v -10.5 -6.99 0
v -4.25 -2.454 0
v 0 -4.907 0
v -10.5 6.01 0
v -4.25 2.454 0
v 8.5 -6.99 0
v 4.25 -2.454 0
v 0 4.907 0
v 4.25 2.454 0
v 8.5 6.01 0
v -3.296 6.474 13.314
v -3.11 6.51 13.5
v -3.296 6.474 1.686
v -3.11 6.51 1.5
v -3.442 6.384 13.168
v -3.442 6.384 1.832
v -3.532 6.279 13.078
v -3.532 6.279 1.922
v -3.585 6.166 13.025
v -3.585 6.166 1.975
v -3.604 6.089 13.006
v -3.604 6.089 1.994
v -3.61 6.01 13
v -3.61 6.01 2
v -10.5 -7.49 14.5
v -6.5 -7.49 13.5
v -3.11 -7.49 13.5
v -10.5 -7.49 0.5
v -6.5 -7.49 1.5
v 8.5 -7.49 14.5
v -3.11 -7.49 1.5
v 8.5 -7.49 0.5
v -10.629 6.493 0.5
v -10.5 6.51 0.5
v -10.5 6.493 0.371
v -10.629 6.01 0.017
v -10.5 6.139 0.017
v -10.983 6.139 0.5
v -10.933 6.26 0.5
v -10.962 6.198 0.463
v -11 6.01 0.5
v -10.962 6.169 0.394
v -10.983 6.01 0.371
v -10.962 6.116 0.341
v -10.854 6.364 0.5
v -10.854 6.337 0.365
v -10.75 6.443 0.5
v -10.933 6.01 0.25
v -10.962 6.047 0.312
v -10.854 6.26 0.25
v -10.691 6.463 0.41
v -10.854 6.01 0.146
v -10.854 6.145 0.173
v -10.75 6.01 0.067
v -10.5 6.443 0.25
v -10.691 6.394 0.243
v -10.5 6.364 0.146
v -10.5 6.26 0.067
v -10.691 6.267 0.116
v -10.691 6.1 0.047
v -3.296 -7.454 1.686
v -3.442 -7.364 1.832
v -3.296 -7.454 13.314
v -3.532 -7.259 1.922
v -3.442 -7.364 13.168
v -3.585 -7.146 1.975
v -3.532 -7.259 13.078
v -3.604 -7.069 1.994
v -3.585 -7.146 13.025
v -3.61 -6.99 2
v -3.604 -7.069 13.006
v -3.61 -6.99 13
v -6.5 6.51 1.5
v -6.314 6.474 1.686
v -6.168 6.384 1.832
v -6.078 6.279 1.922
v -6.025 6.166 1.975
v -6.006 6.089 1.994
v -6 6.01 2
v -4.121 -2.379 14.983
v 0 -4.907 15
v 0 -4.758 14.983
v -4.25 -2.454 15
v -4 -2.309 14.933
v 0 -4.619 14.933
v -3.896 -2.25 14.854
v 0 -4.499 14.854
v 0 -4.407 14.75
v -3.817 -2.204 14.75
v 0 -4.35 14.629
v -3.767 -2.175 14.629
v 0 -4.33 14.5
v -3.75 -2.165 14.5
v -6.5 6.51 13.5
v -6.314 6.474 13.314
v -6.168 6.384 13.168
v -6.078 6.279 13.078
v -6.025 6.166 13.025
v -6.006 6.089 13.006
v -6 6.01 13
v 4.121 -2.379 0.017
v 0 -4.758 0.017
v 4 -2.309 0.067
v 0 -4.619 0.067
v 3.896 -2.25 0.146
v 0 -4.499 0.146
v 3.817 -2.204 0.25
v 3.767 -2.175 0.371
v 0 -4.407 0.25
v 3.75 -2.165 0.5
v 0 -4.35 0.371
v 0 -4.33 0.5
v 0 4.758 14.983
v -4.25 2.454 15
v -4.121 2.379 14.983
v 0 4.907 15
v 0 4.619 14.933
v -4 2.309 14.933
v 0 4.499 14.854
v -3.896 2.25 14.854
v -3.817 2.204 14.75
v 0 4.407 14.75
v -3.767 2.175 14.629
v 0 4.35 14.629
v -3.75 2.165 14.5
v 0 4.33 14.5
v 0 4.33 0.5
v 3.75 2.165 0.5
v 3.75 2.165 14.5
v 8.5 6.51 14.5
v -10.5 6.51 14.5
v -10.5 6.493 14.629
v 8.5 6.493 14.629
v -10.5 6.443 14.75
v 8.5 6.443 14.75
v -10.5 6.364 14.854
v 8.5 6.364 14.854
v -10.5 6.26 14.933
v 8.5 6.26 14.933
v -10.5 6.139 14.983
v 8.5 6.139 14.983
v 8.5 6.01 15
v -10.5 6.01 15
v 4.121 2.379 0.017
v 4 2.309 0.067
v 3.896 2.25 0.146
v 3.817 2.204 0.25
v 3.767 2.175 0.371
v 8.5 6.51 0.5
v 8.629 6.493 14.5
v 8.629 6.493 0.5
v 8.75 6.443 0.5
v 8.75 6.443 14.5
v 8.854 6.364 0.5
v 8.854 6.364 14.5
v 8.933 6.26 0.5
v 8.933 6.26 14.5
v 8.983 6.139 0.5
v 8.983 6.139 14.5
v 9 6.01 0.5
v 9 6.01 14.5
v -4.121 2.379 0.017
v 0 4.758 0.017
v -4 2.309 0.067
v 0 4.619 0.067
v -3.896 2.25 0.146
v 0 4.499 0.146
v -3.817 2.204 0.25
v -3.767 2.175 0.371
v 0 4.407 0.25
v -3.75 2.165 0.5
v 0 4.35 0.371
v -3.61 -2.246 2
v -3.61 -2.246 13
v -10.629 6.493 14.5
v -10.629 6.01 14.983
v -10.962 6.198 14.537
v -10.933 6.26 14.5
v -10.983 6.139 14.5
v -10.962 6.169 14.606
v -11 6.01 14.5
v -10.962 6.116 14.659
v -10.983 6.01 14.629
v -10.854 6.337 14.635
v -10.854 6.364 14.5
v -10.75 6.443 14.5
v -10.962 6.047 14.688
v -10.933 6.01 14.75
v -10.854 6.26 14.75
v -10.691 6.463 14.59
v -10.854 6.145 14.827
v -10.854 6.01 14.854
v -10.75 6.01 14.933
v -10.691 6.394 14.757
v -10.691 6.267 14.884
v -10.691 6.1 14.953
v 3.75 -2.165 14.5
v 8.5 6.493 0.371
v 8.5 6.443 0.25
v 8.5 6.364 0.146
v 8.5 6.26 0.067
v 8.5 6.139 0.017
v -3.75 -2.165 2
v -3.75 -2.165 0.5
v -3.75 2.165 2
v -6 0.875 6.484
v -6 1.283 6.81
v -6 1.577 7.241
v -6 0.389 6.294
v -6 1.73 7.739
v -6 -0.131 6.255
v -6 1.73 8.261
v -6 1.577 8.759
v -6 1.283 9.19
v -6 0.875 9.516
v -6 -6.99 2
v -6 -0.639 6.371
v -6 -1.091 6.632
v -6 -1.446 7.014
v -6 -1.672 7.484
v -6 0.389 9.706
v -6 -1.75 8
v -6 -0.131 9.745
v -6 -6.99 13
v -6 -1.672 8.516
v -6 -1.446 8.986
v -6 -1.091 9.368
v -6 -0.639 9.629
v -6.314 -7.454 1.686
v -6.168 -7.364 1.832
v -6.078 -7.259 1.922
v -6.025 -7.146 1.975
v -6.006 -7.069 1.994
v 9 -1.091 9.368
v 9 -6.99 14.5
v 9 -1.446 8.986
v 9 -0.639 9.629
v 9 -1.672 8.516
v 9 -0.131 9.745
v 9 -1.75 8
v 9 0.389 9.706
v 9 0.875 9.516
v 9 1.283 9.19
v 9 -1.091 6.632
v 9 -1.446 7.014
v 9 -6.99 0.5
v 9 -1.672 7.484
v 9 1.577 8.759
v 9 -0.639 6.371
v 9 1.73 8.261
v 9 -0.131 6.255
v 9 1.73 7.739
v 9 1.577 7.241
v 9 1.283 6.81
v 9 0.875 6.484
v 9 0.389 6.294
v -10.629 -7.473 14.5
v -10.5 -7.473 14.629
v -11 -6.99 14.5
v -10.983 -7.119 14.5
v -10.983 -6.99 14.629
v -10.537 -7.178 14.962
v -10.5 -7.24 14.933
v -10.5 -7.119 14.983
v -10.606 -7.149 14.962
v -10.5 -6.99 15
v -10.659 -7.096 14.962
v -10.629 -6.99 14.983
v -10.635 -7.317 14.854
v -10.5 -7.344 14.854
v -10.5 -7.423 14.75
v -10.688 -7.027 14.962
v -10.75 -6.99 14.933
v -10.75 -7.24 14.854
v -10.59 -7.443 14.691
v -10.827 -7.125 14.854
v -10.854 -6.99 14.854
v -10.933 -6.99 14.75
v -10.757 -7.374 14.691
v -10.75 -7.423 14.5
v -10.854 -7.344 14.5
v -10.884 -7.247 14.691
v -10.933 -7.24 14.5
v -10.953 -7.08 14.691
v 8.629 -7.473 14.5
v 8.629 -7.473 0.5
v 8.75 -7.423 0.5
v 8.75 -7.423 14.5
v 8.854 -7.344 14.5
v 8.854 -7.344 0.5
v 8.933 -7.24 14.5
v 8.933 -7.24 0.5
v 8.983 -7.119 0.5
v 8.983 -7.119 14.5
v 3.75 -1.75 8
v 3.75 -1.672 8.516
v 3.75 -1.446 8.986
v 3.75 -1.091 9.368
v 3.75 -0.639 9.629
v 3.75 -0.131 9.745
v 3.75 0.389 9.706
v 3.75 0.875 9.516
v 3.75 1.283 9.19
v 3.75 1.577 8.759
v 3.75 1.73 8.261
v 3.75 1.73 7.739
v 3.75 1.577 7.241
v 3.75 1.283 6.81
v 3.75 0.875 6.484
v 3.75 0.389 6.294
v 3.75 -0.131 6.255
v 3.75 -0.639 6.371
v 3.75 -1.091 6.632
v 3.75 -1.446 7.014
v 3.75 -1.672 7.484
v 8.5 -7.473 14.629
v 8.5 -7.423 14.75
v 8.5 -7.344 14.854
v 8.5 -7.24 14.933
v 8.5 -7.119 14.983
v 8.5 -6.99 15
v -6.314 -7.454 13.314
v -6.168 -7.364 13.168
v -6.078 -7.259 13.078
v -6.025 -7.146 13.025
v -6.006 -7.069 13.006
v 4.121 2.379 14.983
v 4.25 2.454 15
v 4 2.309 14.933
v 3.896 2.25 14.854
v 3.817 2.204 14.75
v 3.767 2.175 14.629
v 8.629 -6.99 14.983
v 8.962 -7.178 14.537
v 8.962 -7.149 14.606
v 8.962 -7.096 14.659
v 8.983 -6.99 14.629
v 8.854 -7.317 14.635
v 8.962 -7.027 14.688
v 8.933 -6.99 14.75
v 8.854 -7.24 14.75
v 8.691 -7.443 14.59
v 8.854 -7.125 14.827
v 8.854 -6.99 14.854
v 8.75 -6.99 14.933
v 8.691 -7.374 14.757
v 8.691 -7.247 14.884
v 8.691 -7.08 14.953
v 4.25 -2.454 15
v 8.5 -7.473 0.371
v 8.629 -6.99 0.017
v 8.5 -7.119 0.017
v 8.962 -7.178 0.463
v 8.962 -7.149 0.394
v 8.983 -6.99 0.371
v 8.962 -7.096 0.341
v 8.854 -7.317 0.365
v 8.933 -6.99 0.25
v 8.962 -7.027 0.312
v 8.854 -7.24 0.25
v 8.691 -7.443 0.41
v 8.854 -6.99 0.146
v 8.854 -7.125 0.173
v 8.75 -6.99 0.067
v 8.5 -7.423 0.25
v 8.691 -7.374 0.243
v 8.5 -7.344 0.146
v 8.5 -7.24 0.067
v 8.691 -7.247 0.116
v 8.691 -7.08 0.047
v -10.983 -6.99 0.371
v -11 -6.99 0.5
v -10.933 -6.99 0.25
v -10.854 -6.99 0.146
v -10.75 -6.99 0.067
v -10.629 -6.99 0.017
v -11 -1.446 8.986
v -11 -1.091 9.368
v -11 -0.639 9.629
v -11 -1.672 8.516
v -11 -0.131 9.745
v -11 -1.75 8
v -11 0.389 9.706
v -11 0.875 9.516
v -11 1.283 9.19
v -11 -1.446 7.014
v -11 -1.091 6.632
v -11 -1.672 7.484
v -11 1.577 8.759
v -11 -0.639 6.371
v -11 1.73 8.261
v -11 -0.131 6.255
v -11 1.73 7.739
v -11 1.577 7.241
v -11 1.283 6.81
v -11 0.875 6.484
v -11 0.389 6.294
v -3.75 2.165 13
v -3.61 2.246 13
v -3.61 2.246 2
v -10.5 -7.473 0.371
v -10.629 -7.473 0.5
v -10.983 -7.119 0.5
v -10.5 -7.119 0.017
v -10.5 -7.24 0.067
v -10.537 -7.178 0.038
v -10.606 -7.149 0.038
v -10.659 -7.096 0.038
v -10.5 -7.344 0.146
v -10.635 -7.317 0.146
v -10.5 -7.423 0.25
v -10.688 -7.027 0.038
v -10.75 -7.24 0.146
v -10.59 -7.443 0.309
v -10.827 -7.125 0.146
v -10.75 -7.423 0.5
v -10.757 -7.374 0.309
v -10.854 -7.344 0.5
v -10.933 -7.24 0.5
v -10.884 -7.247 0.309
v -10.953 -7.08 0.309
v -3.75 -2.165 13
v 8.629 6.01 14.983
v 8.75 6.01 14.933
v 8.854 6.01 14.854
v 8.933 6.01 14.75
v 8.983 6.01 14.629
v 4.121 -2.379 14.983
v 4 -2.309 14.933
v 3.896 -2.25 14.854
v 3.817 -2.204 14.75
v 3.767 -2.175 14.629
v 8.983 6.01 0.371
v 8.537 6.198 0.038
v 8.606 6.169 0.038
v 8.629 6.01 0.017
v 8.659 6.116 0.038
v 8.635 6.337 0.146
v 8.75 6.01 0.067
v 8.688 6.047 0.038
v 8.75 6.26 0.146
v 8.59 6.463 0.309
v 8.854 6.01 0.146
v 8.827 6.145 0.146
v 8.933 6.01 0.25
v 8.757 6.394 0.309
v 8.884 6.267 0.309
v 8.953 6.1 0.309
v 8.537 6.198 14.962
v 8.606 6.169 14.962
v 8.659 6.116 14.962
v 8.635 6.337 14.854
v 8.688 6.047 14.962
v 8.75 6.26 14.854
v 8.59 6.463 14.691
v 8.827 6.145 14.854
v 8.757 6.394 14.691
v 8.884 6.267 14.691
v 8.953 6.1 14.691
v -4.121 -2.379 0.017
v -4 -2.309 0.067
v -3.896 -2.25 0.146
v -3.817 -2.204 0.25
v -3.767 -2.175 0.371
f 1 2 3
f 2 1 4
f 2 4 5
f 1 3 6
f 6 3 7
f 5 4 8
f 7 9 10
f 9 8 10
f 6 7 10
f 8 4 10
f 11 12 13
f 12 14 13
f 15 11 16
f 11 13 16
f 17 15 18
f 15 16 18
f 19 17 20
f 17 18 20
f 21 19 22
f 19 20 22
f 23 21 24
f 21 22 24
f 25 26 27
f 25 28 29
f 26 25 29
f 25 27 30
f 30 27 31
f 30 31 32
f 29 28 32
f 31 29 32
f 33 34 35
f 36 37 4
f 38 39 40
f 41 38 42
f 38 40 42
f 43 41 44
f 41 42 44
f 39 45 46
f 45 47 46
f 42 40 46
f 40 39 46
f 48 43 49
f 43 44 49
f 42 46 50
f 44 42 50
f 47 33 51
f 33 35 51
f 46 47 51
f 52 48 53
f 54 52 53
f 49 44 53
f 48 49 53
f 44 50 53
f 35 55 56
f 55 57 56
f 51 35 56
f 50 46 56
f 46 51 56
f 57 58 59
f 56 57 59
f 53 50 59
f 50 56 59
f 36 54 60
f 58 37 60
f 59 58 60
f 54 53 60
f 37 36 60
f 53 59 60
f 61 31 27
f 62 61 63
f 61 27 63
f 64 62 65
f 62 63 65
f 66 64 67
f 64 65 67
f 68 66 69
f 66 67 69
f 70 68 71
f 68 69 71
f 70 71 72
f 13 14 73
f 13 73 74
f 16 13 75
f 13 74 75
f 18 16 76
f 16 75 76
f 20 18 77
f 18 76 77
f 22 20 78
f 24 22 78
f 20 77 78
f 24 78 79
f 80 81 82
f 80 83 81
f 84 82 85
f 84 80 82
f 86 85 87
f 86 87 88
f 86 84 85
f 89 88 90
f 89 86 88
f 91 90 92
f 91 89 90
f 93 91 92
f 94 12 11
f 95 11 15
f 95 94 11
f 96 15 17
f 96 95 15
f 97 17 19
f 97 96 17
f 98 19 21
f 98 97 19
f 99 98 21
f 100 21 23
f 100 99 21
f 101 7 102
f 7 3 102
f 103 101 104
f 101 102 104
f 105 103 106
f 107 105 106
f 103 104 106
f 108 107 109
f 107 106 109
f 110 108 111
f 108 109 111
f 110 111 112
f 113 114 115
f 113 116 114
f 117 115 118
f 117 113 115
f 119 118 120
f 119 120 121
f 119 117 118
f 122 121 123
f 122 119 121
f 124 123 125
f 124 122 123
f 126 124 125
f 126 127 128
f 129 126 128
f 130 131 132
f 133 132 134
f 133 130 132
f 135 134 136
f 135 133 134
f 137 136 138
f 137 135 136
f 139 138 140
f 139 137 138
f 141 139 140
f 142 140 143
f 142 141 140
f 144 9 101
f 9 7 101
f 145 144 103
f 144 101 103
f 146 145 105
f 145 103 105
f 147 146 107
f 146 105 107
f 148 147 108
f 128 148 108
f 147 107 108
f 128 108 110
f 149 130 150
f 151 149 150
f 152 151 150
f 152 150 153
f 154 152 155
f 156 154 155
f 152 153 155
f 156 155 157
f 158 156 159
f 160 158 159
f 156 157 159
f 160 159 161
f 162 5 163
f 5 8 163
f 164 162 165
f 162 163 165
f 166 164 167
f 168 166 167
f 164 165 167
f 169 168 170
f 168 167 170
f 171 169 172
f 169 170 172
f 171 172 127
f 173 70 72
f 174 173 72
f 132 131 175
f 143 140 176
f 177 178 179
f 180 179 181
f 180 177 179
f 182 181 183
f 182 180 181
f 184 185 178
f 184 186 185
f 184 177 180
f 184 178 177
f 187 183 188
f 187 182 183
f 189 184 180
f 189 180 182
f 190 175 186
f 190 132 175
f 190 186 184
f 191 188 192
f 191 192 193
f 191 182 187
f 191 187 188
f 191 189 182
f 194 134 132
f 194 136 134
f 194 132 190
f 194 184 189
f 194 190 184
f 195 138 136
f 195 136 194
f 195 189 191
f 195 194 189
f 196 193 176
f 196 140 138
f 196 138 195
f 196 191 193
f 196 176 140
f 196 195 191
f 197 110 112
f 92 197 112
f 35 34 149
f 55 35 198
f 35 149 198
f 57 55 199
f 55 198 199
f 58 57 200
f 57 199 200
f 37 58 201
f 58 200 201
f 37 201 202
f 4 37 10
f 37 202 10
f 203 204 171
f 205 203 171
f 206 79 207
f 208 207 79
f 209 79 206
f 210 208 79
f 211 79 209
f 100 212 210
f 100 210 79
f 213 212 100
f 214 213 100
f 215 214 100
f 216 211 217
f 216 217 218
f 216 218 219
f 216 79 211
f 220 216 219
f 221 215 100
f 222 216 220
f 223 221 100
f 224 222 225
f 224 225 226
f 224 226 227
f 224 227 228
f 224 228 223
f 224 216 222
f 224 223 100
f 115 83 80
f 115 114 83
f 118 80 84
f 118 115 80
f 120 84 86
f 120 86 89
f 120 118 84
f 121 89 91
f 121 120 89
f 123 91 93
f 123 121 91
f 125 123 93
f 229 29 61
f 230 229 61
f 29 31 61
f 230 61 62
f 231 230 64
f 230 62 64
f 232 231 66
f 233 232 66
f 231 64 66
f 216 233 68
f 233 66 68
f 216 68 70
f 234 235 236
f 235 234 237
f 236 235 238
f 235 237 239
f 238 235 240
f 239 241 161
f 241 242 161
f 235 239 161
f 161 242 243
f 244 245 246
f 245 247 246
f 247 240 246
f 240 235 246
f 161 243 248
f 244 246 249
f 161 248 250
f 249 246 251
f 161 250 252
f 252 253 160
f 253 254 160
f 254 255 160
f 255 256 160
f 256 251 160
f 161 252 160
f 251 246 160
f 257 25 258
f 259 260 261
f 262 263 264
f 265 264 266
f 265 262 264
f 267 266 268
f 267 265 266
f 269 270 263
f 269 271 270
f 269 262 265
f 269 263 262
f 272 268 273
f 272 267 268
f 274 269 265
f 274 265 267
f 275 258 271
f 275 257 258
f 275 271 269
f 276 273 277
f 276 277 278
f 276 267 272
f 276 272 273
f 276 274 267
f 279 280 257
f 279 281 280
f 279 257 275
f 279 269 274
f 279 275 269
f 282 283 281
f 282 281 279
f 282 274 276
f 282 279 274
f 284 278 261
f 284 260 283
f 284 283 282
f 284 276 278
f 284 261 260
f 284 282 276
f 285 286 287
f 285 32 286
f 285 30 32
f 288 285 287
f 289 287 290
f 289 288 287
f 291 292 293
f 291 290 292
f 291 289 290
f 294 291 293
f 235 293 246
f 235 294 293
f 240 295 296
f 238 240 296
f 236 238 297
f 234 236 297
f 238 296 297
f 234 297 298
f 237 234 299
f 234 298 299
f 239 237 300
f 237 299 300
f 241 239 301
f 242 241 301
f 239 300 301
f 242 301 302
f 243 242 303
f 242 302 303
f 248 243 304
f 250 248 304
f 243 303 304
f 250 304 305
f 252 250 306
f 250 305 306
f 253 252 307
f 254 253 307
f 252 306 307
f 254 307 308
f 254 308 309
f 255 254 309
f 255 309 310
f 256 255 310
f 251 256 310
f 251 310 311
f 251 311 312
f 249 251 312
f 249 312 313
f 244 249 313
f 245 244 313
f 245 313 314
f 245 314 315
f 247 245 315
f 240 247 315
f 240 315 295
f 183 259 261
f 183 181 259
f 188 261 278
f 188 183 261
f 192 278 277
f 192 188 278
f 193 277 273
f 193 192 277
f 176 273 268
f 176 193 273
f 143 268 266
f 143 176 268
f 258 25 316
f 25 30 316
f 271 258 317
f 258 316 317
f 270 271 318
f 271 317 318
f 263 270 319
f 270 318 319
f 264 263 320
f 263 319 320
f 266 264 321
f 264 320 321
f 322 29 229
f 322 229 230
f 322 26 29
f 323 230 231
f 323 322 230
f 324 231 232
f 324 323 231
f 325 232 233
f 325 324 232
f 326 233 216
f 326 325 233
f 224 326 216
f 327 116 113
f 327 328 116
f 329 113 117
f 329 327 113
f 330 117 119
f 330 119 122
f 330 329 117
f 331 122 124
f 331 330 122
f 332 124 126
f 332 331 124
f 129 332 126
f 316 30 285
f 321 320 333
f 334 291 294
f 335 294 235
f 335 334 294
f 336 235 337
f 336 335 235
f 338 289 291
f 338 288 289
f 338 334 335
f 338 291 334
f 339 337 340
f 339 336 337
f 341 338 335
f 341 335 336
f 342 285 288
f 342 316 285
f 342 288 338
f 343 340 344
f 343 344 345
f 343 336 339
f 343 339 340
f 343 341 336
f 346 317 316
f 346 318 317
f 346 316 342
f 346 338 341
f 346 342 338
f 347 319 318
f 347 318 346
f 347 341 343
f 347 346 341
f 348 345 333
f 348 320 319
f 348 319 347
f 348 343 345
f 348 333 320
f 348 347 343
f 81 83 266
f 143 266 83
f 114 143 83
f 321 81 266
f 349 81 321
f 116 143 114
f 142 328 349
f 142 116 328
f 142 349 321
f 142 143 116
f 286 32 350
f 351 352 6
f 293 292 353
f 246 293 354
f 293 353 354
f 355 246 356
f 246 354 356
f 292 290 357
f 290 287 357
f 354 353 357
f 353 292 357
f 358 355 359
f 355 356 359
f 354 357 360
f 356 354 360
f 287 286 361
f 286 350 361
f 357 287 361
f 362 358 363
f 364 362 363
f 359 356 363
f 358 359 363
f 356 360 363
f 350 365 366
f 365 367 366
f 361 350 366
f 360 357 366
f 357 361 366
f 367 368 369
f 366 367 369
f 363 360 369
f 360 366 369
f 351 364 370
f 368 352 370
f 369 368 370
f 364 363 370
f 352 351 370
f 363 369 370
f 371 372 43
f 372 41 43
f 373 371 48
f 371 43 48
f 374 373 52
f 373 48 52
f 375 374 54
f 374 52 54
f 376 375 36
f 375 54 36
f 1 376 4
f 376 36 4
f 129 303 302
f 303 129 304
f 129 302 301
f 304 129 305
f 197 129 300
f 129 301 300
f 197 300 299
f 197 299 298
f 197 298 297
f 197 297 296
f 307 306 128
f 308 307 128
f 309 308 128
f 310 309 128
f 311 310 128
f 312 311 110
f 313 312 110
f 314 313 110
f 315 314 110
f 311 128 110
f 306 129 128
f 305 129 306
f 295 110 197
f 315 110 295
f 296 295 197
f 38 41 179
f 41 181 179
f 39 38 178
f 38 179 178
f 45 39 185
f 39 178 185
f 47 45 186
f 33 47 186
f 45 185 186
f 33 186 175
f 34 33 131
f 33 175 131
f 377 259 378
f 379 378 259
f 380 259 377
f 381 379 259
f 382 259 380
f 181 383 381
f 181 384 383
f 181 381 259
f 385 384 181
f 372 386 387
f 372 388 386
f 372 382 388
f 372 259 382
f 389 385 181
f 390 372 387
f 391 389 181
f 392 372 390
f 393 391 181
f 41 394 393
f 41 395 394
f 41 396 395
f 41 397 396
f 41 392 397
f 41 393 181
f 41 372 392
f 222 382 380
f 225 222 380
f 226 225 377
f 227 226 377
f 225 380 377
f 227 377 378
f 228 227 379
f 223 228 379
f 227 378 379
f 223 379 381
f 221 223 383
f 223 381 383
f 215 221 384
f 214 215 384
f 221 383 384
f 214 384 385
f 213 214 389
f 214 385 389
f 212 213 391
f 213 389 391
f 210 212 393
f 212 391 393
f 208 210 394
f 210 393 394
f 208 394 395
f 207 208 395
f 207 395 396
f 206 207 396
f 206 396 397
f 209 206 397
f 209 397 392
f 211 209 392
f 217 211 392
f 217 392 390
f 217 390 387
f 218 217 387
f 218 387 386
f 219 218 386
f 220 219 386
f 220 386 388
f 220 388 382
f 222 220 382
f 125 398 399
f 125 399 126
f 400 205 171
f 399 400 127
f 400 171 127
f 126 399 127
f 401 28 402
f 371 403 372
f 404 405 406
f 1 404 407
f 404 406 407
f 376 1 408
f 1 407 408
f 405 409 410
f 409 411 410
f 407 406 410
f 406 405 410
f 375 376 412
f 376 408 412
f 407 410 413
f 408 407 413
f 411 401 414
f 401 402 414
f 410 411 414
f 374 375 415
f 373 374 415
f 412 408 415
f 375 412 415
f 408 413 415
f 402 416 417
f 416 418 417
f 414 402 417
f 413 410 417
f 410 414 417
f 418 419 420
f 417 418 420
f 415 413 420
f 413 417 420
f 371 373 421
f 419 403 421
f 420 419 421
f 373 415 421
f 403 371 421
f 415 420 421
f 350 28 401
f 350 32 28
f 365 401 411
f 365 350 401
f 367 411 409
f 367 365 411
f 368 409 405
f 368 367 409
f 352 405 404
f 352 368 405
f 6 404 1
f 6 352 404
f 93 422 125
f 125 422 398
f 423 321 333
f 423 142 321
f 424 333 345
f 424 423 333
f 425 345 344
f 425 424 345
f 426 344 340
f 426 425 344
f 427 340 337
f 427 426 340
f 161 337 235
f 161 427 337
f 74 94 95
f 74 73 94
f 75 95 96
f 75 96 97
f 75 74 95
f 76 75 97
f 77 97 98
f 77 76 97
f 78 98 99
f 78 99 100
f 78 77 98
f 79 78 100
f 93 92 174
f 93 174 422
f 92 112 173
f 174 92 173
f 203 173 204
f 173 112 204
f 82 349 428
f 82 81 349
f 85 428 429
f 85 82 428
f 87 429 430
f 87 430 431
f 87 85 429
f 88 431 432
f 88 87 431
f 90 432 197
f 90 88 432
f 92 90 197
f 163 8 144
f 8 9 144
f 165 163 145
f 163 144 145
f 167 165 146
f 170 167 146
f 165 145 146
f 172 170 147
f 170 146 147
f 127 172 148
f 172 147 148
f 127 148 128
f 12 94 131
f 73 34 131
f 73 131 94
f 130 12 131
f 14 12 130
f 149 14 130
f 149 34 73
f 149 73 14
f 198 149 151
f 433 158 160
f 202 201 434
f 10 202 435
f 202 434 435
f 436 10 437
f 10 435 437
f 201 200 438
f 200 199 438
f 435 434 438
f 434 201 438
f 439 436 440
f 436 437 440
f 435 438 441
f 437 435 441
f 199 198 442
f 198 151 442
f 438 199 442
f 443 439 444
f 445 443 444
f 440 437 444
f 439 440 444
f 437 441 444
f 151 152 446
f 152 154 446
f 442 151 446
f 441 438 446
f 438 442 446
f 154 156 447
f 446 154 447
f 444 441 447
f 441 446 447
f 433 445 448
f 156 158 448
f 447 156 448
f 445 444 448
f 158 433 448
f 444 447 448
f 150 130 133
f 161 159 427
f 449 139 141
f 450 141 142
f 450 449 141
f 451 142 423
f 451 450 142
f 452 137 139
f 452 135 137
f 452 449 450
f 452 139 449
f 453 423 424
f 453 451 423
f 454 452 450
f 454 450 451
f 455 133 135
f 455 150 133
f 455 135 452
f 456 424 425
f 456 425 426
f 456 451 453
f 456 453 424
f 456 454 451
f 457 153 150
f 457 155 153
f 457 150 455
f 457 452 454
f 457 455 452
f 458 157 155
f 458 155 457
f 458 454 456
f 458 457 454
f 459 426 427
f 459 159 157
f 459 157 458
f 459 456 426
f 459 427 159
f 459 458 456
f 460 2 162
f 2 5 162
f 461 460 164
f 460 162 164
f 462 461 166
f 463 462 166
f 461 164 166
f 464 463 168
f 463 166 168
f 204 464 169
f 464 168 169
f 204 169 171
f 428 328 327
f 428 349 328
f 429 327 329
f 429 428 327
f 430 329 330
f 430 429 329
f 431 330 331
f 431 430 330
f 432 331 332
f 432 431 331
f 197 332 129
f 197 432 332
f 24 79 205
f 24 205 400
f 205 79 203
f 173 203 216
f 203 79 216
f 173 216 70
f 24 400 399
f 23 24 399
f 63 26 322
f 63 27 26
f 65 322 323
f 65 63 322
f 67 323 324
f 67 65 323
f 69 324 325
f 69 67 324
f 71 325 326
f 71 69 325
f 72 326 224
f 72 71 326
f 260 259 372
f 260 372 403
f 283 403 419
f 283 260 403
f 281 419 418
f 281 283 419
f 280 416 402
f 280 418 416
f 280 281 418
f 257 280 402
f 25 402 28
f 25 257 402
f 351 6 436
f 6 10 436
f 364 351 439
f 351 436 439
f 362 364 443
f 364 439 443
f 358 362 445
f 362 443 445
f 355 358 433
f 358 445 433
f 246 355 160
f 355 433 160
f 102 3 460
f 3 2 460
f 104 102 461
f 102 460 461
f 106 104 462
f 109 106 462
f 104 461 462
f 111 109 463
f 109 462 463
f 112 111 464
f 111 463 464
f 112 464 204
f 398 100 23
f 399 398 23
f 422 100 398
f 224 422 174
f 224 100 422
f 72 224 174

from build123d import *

# Parameters (mm, degrees)
F0_W          = 20
F0_H          = 14
F1_DEPTH      = 15
F2_W          = 2.39
F2_H          = 11
F3_DEPTH      = 14.001
F5_R          = 0.5
F4_R          = 1.75
F6_DEPTH      = 42
F6_DEPTH_BACK = 20.001


# Not quite as in the source:
# - an extrude ends at something that could not be found from the text; its depth is read off the source's solid


with BuildPart() as f1:
    # F0 (on Top) → F1 (new body)
    with BuildSketch(Plane.XY):
        with Locations((-1, -0.4900455125)):
            Rectangle(F0_W, F0_H)
        Polygon((3.75, -2.1650635095), (0, -4.3301270189), (-3.75, -2.1650635095), (-3.75, 2.1650635095), (0, 4.3301270189), (3.75, 2.1650635095), align=None, mode=Mode.SUBTRACT)
    extrude(amount=F1_DEPTH)

    # F2 (on face) → F3 (cut, through all)
    with BuildSketch(Plane.XZ.offset(7.4900455125)):
        with Locations((-4.805, 7.5)):
            Rectangle(F2_W, F2_H)
    extrude(amount=-F3_DEPTH, mode=Mode.SUBTRACT)

    # F5
    f5_edges = [f1.edges().sort_by_distance(p)[0] for p in [
        (-11, -7.490046, 7.5),
        (-1, -7.490046, 0),
        (-1, -7.490046, 15),
        (9, -7.490046, 7.5),
        (-3.61, -7.490046, 7.5),
        (-4.805, -7.490046, 2),
        (-6, -7.490046, 7.5),
        (-4.805, -7.490046, 13),
        (9, 6.509954, 7.5),
        (-1, 6.509954, 0),
        (-1, 6.509954, 15),
        (-11, 6.509954, 7.5),
        (-4.805, 6.509954, 13),
        (-6, 6.509954, 7.5),
        (-4.805, 6.509954, 2),
        (-3.61, 6.509954, 7.5),
        (9, -0.490046, 15),
        (-11, -0.490046, 15),
        (3.75, 0, 15),
        (1.875, -3.247595, 15),
        (-1.875, -3.247595, 15),
        (-3.75, 0, 15),
        (-1.875, 3.247595, 15),
        (1.875, 3.247595, 15),
        (9, -0.490046, 0),
        (-11, -0.490046, 0),
        (3.75, 0, 0),
        (1.875, -3.247595, 0),
        (-1.875, -3.247595, 0),
        (-3.75, 0, 0),
        (-1.875, 3.247595, 0),
        (1.875, 3.247595, 0),
    ]]
    fillet(f5_edges, radius=F5_R)

    # F4 (on face) → F6 (cut, two sides)
    with BuildSketch(Plane(origin=(-11, 0, 0), x_dir=(0, -1, 0), z_dir=(-1, 0, 0))) as f6_sk:
        with Locations((0, 8)):
            Circle(F4_R)
    extrude(amount=F6_DEPTH, mode=Mode.SUBTRACT)
    extrude(f6_sk.sketch, amount=-F6_DEPTH_BACK, mode=Mode.SUBTRACT)


solid = f1.part
